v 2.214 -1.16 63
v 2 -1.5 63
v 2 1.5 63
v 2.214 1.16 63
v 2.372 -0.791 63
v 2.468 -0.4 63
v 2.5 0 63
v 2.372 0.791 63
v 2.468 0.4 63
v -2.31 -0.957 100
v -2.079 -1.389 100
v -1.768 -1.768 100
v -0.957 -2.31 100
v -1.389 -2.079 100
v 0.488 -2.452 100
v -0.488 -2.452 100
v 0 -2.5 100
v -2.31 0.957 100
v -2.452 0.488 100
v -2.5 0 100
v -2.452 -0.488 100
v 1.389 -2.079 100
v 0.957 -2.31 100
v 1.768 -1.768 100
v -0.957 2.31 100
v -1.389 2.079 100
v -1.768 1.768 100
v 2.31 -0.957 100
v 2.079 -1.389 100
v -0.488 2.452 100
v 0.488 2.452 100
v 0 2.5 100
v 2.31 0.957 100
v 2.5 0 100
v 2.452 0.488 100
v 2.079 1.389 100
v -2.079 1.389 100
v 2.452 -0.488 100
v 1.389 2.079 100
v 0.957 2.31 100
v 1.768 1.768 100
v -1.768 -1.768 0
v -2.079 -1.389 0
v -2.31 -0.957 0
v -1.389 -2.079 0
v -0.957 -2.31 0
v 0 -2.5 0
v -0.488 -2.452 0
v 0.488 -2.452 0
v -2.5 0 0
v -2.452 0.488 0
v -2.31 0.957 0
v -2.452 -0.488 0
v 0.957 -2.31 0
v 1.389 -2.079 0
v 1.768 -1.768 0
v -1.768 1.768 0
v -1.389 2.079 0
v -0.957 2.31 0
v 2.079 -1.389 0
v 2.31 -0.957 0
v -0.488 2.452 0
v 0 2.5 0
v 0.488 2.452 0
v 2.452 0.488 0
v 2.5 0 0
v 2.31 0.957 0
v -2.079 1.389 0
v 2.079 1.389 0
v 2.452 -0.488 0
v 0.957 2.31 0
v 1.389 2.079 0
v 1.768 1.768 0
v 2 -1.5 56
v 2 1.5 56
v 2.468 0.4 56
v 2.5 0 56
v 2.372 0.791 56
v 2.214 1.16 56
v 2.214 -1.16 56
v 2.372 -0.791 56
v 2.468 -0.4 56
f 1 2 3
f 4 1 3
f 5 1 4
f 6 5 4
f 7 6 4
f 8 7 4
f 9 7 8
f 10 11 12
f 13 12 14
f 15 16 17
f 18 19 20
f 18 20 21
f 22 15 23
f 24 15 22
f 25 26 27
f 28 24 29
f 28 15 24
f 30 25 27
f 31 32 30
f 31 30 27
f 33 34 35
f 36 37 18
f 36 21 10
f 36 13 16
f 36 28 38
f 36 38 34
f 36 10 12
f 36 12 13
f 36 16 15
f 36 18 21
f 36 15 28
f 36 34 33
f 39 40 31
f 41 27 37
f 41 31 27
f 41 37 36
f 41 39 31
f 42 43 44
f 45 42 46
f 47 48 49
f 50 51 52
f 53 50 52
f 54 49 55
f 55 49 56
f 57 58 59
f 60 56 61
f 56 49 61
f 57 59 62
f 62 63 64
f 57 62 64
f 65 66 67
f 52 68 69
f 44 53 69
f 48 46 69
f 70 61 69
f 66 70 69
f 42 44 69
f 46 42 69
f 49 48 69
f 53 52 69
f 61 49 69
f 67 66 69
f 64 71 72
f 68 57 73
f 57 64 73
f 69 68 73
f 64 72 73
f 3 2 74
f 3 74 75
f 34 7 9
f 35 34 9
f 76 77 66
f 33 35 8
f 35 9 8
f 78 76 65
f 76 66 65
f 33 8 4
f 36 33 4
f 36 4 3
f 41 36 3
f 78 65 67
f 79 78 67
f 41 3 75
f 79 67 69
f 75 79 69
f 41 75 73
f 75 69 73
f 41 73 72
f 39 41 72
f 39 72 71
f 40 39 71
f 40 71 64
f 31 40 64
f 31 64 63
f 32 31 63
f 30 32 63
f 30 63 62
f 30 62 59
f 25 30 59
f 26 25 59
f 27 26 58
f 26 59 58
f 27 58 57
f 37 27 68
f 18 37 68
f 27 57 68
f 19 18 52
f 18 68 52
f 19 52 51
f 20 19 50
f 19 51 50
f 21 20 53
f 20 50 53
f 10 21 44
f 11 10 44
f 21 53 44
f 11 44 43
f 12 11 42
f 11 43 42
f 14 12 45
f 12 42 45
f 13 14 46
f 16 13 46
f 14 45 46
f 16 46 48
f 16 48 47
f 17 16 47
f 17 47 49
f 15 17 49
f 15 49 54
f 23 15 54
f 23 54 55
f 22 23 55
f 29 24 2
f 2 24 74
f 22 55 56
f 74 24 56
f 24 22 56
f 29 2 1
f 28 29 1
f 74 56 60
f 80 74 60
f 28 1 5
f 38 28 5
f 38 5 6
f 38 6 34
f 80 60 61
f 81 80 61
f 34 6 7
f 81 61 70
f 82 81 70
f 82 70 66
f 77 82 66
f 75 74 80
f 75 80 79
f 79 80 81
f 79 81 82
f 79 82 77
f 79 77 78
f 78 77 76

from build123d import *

# Parameters (mm, degrees)
SKETCH001_W  = 7
SKETCH001_H  = 7
PAD001_DEPTH = 2
SKETCH_R     = 2.5
PAD_DEPTH    = 100


with BuildPart() as pad001:
    # Sketch001 → Pad001 (new body)
    with BuildSketch(Plane.YZ.offset(2)):
        with Locations((0, 59.5)):
            Rectangle(SKETCH001_W, SKETCH001_H)
    extrude(amount=PAD001_DEPTH)


with BuildPart() as cut:
    # Sketch → Pad (new body)
    with BuildSketch(Plane.XY):
        Circle(SKETCH_R)
    extrude(amount=PAD_DEPTH)

    # Cut: cut Pad001
    add(pad001.part, mode=Mode.SUBTRACT)


solid = cut.part
